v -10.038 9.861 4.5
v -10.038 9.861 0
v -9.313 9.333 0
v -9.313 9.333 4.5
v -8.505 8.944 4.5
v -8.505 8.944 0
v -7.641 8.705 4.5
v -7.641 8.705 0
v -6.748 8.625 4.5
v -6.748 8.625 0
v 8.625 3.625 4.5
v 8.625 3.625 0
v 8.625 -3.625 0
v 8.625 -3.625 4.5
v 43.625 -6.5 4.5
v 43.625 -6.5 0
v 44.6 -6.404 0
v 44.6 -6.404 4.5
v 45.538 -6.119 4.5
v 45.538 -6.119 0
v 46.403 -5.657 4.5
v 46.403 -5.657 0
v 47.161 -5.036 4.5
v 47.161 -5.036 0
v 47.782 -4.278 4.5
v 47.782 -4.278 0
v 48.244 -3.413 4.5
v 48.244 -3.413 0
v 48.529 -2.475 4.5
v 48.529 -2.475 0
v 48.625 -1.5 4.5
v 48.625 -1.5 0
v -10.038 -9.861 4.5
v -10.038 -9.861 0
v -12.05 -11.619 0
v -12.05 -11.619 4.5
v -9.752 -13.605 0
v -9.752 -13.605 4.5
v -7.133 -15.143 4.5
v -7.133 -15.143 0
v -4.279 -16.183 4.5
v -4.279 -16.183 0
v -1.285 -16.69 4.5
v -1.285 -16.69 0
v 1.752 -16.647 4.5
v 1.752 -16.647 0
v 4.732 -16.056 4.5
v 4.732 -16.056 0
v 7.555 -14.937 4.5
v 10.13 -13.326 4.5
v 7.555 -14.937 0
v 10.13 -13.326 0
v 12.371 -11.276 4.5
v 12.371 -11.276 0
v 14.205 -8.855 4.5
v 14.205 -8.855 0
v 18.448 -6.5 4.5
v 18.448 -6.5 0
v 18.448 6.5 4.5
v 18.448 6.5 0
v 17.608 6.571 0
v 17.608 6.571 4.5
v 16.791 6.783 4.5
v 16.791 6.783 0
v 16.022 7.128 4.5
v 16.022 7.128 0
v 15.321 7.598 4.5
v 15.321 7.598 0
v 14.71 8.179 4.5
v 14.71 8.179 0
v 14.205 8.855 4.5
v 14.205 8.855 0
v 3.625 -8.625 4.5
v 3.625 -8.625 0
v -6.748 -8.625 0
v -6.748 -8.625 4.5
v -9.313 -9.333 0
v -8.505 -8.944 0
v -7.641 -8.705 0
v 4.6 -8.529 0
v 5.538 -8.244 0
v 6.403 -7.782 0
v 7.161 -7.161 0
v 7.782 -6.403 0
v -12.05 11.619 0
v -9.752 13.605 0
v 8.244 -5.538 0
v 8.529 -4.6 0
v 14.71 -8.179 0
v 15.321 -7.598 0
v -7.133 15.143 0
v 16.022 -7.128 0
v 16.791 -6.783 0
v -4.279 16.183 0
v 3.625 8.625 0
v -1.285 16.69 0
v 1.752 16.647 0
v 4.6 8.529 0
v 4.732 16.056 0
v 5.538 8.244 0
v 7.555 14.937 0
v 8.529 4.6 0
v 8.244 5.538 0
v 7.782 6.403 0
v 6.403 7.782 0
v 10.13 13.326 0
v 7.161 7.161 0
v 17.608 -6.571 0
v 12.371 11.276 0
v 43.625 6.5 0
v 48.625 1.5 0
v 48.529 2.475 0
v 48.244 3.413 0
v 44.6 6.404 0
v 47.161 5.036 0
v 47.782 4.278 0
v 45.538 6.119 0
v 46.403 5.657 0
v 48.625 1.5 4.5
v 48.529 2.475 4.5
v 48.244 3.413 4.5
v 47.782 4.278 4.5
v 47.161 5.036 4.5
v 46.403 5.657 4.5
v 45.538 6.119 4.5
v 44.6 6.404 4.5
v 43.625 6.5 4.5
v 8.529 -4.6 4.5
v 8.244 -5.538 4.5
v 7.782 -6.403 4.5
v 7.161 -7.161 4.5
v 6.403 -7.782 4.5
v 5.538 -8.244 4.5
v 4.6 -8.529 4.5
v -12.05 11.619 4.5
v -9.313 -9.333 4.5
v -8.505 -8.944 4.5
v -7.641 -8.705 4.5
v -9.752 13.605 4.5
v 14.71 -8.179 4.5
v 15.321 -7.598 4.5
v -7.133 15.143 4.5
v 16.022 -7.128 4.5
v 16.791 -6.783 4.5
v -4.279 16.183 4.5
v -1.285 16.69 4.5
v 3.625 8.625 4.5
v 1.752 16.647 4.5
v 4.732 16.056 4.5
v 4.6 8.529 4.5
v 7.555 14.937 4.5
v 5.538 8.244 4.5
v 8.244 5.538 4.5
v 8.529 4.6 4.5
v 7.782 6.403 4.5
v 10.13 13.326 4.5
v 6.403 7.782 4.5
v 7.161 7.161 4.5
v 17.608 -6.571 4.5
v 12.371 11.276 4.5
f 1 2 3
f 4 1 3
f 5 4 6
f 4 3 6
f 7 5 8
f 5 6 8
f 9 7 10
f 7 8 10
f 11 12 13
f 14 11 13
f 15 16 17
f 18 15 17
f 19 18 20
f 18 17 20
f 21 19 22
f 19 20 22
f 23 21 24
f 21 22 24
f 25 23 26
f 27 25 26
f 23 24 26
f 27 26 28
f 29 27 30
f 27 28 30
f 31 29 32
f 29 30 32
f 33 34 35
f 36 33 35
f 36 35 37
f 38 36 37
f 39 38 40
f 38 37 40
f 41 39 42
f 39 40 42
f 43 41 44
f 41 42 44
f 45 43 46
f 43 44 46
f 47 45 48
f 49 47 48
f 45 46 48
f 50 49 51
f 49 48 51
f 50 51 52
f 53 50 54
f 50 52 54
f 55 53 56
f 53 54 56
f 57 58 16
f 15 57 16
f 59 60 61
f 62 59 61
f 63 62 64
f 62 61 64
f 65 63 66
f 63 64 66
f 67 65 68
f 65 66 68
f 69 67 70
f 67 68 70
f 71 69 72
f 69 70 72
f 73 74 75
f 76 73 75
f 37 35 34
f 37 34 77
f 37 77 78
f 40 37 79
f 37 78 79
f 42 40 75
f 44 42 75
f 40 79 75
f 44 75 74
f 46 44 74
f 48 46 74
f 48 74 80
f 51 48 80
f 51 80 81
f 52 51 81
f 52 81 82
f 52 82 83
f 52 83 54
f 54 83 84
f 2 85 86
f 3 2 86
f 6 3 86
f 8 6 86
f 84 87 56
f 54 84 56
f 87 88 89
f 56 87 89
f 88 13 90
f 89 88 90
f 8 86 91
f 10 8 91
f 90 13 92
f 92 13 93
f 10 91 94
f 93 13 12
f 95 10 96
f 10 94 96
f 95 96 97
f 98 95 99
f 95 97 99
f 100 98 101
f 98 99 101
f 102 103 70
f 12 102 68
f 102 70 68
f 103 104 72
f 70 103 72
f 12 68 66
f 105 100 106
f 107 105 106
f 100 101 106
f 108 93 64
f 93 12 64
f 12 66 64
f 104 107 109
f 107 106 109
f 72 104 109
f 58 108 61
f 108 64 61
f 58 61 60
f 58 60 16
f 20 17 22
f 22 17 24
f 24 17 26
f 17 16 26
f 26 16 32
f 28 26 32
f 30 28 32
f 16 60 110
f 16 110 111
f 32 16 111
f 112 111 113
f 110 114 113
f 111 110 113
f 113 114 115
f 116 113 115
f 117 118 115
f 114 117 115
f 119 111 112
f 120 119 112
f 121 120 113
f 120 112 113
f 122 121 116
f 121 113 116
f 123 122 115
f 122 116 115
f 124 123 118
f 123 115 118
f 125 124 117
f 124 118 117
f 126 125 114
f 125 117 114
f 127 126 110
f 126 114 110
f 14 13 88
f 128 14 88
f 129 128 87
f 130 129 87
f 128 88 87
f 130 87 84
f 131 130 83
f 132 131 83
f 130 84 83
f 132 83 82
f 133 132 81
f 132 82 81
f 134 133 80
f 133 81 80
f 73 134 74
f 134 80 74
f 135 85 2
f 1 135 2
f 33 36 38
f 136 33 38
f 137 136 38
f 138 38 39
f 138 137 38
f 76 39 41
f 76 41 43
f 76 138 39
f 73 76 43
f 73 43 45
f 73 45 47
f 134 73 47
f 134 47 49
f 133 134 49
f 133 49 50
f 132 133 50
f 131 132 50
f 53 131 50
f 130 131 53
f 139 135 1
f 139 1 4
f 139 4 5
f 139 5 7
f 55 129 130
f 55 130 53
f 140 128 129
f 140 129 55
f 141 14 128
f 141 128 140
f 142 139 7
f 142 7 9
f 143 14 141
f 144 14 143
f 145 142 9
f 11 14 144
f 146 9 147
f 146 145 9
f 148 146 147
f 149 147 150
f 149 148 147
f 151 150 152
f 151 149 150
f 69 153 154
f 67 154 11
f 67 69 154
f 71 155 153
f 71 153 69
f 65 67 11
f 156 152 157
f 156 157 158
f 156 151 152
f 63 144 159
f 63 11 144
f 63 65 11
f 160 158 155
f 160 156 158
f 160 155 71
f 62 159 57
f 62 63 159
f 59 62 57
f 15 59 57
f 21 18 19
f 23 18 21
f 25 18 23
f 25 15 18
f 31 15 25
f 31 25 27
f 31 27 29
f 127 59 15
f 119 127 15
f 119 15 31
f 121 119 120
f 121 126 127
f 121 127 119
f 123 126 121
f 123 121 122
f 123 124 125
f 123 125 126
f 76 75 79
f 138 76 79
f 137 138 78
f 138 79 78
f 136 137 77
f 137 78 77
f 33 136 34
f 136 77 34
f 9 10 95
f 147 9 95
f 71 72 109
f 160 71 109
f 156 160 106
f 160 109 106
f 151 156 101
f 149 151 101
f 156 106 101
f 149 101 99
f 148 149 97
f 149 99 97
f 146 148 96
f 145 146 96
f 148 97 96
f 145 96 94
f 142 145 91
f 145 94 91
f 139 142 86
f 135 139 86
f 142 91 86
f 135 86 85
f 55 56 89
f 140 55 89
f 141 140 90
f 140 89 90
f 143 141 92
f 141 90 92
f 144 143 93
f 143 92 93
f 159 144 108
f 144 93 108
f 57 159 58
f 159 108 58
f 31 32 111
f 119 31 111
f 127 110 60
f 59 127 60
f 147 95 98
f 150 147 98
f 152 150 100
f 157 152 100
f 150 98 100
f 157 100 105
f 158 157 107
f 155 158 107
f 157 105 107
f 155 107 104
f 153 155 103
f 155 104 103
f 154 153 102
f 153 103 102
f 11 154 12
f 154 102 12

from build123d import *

# Parameters (mm, degrees)
F1_DEPTH = 4.5


with BuildPart() as f1:
    # F0 (on Top) → F1 (new body)
    with BuildSketch(Plane.XY):
        with BuildLine():
            Line((-6.747654, 8.625), (3.625, 8.625))
            ThreePointArc((3.625, 8.625), (7.160534, 7.160534), (8.625, 3.625))
            Line((8.625, 3.625), (8.625, -3.625))
            ThreePointArc((8.625, -3.625), (7.160534, -7.160534), (3.625, -8.625))
            Line((3.625, -8.625), (-6.747654, -8.625))
            ThreePointArc((-6.747654, -8.625), (-8.505197, -8.944076), (-10.038423, -9.860582))
            Line((-10.038423, -9.860582), (-12.049675, -11.618772))
            ThreePointArc((-12.049675, -11.618772), (1.752407, -16.64691), (14.204929, -8.854971))
            ThreePointArc((14.204929, -8.854971), (16.021618, -7.128207), (18.44802, -6.5))
            Line((18.44802, -6.5), (43.625, -6.5))
            ThreePointArc((43.625, -6.5), (47.160534, -5.035534), (48.625, -1.5))
            Line((48.625, -1.5), (48.625, 1.5))
            ThreePointArc((48.625, 1.5), (47.160534, 5.035534), (43.625, 6.5))
            Line((43.625, 6.5), (18.44802, 6.5))
            ThreePointArc((18.44802, 6.5), (16.021618, 7.128207), (14.204929, 8.854971))
            ThreePointArc((14.204929, 8.854971), (1.752407, 16.64691), (-12.049675, 11.618772))
            Line((-12.049675, 11.618772), (-10.038423, 9.860582))
            ThreePointArc((-10.038423, 9.860582), (-8.505197, 8.944076), (-6.747654, 8.625))
        make_face()
    extrude(amount=F1_DEPTH)


solid = f1.part
